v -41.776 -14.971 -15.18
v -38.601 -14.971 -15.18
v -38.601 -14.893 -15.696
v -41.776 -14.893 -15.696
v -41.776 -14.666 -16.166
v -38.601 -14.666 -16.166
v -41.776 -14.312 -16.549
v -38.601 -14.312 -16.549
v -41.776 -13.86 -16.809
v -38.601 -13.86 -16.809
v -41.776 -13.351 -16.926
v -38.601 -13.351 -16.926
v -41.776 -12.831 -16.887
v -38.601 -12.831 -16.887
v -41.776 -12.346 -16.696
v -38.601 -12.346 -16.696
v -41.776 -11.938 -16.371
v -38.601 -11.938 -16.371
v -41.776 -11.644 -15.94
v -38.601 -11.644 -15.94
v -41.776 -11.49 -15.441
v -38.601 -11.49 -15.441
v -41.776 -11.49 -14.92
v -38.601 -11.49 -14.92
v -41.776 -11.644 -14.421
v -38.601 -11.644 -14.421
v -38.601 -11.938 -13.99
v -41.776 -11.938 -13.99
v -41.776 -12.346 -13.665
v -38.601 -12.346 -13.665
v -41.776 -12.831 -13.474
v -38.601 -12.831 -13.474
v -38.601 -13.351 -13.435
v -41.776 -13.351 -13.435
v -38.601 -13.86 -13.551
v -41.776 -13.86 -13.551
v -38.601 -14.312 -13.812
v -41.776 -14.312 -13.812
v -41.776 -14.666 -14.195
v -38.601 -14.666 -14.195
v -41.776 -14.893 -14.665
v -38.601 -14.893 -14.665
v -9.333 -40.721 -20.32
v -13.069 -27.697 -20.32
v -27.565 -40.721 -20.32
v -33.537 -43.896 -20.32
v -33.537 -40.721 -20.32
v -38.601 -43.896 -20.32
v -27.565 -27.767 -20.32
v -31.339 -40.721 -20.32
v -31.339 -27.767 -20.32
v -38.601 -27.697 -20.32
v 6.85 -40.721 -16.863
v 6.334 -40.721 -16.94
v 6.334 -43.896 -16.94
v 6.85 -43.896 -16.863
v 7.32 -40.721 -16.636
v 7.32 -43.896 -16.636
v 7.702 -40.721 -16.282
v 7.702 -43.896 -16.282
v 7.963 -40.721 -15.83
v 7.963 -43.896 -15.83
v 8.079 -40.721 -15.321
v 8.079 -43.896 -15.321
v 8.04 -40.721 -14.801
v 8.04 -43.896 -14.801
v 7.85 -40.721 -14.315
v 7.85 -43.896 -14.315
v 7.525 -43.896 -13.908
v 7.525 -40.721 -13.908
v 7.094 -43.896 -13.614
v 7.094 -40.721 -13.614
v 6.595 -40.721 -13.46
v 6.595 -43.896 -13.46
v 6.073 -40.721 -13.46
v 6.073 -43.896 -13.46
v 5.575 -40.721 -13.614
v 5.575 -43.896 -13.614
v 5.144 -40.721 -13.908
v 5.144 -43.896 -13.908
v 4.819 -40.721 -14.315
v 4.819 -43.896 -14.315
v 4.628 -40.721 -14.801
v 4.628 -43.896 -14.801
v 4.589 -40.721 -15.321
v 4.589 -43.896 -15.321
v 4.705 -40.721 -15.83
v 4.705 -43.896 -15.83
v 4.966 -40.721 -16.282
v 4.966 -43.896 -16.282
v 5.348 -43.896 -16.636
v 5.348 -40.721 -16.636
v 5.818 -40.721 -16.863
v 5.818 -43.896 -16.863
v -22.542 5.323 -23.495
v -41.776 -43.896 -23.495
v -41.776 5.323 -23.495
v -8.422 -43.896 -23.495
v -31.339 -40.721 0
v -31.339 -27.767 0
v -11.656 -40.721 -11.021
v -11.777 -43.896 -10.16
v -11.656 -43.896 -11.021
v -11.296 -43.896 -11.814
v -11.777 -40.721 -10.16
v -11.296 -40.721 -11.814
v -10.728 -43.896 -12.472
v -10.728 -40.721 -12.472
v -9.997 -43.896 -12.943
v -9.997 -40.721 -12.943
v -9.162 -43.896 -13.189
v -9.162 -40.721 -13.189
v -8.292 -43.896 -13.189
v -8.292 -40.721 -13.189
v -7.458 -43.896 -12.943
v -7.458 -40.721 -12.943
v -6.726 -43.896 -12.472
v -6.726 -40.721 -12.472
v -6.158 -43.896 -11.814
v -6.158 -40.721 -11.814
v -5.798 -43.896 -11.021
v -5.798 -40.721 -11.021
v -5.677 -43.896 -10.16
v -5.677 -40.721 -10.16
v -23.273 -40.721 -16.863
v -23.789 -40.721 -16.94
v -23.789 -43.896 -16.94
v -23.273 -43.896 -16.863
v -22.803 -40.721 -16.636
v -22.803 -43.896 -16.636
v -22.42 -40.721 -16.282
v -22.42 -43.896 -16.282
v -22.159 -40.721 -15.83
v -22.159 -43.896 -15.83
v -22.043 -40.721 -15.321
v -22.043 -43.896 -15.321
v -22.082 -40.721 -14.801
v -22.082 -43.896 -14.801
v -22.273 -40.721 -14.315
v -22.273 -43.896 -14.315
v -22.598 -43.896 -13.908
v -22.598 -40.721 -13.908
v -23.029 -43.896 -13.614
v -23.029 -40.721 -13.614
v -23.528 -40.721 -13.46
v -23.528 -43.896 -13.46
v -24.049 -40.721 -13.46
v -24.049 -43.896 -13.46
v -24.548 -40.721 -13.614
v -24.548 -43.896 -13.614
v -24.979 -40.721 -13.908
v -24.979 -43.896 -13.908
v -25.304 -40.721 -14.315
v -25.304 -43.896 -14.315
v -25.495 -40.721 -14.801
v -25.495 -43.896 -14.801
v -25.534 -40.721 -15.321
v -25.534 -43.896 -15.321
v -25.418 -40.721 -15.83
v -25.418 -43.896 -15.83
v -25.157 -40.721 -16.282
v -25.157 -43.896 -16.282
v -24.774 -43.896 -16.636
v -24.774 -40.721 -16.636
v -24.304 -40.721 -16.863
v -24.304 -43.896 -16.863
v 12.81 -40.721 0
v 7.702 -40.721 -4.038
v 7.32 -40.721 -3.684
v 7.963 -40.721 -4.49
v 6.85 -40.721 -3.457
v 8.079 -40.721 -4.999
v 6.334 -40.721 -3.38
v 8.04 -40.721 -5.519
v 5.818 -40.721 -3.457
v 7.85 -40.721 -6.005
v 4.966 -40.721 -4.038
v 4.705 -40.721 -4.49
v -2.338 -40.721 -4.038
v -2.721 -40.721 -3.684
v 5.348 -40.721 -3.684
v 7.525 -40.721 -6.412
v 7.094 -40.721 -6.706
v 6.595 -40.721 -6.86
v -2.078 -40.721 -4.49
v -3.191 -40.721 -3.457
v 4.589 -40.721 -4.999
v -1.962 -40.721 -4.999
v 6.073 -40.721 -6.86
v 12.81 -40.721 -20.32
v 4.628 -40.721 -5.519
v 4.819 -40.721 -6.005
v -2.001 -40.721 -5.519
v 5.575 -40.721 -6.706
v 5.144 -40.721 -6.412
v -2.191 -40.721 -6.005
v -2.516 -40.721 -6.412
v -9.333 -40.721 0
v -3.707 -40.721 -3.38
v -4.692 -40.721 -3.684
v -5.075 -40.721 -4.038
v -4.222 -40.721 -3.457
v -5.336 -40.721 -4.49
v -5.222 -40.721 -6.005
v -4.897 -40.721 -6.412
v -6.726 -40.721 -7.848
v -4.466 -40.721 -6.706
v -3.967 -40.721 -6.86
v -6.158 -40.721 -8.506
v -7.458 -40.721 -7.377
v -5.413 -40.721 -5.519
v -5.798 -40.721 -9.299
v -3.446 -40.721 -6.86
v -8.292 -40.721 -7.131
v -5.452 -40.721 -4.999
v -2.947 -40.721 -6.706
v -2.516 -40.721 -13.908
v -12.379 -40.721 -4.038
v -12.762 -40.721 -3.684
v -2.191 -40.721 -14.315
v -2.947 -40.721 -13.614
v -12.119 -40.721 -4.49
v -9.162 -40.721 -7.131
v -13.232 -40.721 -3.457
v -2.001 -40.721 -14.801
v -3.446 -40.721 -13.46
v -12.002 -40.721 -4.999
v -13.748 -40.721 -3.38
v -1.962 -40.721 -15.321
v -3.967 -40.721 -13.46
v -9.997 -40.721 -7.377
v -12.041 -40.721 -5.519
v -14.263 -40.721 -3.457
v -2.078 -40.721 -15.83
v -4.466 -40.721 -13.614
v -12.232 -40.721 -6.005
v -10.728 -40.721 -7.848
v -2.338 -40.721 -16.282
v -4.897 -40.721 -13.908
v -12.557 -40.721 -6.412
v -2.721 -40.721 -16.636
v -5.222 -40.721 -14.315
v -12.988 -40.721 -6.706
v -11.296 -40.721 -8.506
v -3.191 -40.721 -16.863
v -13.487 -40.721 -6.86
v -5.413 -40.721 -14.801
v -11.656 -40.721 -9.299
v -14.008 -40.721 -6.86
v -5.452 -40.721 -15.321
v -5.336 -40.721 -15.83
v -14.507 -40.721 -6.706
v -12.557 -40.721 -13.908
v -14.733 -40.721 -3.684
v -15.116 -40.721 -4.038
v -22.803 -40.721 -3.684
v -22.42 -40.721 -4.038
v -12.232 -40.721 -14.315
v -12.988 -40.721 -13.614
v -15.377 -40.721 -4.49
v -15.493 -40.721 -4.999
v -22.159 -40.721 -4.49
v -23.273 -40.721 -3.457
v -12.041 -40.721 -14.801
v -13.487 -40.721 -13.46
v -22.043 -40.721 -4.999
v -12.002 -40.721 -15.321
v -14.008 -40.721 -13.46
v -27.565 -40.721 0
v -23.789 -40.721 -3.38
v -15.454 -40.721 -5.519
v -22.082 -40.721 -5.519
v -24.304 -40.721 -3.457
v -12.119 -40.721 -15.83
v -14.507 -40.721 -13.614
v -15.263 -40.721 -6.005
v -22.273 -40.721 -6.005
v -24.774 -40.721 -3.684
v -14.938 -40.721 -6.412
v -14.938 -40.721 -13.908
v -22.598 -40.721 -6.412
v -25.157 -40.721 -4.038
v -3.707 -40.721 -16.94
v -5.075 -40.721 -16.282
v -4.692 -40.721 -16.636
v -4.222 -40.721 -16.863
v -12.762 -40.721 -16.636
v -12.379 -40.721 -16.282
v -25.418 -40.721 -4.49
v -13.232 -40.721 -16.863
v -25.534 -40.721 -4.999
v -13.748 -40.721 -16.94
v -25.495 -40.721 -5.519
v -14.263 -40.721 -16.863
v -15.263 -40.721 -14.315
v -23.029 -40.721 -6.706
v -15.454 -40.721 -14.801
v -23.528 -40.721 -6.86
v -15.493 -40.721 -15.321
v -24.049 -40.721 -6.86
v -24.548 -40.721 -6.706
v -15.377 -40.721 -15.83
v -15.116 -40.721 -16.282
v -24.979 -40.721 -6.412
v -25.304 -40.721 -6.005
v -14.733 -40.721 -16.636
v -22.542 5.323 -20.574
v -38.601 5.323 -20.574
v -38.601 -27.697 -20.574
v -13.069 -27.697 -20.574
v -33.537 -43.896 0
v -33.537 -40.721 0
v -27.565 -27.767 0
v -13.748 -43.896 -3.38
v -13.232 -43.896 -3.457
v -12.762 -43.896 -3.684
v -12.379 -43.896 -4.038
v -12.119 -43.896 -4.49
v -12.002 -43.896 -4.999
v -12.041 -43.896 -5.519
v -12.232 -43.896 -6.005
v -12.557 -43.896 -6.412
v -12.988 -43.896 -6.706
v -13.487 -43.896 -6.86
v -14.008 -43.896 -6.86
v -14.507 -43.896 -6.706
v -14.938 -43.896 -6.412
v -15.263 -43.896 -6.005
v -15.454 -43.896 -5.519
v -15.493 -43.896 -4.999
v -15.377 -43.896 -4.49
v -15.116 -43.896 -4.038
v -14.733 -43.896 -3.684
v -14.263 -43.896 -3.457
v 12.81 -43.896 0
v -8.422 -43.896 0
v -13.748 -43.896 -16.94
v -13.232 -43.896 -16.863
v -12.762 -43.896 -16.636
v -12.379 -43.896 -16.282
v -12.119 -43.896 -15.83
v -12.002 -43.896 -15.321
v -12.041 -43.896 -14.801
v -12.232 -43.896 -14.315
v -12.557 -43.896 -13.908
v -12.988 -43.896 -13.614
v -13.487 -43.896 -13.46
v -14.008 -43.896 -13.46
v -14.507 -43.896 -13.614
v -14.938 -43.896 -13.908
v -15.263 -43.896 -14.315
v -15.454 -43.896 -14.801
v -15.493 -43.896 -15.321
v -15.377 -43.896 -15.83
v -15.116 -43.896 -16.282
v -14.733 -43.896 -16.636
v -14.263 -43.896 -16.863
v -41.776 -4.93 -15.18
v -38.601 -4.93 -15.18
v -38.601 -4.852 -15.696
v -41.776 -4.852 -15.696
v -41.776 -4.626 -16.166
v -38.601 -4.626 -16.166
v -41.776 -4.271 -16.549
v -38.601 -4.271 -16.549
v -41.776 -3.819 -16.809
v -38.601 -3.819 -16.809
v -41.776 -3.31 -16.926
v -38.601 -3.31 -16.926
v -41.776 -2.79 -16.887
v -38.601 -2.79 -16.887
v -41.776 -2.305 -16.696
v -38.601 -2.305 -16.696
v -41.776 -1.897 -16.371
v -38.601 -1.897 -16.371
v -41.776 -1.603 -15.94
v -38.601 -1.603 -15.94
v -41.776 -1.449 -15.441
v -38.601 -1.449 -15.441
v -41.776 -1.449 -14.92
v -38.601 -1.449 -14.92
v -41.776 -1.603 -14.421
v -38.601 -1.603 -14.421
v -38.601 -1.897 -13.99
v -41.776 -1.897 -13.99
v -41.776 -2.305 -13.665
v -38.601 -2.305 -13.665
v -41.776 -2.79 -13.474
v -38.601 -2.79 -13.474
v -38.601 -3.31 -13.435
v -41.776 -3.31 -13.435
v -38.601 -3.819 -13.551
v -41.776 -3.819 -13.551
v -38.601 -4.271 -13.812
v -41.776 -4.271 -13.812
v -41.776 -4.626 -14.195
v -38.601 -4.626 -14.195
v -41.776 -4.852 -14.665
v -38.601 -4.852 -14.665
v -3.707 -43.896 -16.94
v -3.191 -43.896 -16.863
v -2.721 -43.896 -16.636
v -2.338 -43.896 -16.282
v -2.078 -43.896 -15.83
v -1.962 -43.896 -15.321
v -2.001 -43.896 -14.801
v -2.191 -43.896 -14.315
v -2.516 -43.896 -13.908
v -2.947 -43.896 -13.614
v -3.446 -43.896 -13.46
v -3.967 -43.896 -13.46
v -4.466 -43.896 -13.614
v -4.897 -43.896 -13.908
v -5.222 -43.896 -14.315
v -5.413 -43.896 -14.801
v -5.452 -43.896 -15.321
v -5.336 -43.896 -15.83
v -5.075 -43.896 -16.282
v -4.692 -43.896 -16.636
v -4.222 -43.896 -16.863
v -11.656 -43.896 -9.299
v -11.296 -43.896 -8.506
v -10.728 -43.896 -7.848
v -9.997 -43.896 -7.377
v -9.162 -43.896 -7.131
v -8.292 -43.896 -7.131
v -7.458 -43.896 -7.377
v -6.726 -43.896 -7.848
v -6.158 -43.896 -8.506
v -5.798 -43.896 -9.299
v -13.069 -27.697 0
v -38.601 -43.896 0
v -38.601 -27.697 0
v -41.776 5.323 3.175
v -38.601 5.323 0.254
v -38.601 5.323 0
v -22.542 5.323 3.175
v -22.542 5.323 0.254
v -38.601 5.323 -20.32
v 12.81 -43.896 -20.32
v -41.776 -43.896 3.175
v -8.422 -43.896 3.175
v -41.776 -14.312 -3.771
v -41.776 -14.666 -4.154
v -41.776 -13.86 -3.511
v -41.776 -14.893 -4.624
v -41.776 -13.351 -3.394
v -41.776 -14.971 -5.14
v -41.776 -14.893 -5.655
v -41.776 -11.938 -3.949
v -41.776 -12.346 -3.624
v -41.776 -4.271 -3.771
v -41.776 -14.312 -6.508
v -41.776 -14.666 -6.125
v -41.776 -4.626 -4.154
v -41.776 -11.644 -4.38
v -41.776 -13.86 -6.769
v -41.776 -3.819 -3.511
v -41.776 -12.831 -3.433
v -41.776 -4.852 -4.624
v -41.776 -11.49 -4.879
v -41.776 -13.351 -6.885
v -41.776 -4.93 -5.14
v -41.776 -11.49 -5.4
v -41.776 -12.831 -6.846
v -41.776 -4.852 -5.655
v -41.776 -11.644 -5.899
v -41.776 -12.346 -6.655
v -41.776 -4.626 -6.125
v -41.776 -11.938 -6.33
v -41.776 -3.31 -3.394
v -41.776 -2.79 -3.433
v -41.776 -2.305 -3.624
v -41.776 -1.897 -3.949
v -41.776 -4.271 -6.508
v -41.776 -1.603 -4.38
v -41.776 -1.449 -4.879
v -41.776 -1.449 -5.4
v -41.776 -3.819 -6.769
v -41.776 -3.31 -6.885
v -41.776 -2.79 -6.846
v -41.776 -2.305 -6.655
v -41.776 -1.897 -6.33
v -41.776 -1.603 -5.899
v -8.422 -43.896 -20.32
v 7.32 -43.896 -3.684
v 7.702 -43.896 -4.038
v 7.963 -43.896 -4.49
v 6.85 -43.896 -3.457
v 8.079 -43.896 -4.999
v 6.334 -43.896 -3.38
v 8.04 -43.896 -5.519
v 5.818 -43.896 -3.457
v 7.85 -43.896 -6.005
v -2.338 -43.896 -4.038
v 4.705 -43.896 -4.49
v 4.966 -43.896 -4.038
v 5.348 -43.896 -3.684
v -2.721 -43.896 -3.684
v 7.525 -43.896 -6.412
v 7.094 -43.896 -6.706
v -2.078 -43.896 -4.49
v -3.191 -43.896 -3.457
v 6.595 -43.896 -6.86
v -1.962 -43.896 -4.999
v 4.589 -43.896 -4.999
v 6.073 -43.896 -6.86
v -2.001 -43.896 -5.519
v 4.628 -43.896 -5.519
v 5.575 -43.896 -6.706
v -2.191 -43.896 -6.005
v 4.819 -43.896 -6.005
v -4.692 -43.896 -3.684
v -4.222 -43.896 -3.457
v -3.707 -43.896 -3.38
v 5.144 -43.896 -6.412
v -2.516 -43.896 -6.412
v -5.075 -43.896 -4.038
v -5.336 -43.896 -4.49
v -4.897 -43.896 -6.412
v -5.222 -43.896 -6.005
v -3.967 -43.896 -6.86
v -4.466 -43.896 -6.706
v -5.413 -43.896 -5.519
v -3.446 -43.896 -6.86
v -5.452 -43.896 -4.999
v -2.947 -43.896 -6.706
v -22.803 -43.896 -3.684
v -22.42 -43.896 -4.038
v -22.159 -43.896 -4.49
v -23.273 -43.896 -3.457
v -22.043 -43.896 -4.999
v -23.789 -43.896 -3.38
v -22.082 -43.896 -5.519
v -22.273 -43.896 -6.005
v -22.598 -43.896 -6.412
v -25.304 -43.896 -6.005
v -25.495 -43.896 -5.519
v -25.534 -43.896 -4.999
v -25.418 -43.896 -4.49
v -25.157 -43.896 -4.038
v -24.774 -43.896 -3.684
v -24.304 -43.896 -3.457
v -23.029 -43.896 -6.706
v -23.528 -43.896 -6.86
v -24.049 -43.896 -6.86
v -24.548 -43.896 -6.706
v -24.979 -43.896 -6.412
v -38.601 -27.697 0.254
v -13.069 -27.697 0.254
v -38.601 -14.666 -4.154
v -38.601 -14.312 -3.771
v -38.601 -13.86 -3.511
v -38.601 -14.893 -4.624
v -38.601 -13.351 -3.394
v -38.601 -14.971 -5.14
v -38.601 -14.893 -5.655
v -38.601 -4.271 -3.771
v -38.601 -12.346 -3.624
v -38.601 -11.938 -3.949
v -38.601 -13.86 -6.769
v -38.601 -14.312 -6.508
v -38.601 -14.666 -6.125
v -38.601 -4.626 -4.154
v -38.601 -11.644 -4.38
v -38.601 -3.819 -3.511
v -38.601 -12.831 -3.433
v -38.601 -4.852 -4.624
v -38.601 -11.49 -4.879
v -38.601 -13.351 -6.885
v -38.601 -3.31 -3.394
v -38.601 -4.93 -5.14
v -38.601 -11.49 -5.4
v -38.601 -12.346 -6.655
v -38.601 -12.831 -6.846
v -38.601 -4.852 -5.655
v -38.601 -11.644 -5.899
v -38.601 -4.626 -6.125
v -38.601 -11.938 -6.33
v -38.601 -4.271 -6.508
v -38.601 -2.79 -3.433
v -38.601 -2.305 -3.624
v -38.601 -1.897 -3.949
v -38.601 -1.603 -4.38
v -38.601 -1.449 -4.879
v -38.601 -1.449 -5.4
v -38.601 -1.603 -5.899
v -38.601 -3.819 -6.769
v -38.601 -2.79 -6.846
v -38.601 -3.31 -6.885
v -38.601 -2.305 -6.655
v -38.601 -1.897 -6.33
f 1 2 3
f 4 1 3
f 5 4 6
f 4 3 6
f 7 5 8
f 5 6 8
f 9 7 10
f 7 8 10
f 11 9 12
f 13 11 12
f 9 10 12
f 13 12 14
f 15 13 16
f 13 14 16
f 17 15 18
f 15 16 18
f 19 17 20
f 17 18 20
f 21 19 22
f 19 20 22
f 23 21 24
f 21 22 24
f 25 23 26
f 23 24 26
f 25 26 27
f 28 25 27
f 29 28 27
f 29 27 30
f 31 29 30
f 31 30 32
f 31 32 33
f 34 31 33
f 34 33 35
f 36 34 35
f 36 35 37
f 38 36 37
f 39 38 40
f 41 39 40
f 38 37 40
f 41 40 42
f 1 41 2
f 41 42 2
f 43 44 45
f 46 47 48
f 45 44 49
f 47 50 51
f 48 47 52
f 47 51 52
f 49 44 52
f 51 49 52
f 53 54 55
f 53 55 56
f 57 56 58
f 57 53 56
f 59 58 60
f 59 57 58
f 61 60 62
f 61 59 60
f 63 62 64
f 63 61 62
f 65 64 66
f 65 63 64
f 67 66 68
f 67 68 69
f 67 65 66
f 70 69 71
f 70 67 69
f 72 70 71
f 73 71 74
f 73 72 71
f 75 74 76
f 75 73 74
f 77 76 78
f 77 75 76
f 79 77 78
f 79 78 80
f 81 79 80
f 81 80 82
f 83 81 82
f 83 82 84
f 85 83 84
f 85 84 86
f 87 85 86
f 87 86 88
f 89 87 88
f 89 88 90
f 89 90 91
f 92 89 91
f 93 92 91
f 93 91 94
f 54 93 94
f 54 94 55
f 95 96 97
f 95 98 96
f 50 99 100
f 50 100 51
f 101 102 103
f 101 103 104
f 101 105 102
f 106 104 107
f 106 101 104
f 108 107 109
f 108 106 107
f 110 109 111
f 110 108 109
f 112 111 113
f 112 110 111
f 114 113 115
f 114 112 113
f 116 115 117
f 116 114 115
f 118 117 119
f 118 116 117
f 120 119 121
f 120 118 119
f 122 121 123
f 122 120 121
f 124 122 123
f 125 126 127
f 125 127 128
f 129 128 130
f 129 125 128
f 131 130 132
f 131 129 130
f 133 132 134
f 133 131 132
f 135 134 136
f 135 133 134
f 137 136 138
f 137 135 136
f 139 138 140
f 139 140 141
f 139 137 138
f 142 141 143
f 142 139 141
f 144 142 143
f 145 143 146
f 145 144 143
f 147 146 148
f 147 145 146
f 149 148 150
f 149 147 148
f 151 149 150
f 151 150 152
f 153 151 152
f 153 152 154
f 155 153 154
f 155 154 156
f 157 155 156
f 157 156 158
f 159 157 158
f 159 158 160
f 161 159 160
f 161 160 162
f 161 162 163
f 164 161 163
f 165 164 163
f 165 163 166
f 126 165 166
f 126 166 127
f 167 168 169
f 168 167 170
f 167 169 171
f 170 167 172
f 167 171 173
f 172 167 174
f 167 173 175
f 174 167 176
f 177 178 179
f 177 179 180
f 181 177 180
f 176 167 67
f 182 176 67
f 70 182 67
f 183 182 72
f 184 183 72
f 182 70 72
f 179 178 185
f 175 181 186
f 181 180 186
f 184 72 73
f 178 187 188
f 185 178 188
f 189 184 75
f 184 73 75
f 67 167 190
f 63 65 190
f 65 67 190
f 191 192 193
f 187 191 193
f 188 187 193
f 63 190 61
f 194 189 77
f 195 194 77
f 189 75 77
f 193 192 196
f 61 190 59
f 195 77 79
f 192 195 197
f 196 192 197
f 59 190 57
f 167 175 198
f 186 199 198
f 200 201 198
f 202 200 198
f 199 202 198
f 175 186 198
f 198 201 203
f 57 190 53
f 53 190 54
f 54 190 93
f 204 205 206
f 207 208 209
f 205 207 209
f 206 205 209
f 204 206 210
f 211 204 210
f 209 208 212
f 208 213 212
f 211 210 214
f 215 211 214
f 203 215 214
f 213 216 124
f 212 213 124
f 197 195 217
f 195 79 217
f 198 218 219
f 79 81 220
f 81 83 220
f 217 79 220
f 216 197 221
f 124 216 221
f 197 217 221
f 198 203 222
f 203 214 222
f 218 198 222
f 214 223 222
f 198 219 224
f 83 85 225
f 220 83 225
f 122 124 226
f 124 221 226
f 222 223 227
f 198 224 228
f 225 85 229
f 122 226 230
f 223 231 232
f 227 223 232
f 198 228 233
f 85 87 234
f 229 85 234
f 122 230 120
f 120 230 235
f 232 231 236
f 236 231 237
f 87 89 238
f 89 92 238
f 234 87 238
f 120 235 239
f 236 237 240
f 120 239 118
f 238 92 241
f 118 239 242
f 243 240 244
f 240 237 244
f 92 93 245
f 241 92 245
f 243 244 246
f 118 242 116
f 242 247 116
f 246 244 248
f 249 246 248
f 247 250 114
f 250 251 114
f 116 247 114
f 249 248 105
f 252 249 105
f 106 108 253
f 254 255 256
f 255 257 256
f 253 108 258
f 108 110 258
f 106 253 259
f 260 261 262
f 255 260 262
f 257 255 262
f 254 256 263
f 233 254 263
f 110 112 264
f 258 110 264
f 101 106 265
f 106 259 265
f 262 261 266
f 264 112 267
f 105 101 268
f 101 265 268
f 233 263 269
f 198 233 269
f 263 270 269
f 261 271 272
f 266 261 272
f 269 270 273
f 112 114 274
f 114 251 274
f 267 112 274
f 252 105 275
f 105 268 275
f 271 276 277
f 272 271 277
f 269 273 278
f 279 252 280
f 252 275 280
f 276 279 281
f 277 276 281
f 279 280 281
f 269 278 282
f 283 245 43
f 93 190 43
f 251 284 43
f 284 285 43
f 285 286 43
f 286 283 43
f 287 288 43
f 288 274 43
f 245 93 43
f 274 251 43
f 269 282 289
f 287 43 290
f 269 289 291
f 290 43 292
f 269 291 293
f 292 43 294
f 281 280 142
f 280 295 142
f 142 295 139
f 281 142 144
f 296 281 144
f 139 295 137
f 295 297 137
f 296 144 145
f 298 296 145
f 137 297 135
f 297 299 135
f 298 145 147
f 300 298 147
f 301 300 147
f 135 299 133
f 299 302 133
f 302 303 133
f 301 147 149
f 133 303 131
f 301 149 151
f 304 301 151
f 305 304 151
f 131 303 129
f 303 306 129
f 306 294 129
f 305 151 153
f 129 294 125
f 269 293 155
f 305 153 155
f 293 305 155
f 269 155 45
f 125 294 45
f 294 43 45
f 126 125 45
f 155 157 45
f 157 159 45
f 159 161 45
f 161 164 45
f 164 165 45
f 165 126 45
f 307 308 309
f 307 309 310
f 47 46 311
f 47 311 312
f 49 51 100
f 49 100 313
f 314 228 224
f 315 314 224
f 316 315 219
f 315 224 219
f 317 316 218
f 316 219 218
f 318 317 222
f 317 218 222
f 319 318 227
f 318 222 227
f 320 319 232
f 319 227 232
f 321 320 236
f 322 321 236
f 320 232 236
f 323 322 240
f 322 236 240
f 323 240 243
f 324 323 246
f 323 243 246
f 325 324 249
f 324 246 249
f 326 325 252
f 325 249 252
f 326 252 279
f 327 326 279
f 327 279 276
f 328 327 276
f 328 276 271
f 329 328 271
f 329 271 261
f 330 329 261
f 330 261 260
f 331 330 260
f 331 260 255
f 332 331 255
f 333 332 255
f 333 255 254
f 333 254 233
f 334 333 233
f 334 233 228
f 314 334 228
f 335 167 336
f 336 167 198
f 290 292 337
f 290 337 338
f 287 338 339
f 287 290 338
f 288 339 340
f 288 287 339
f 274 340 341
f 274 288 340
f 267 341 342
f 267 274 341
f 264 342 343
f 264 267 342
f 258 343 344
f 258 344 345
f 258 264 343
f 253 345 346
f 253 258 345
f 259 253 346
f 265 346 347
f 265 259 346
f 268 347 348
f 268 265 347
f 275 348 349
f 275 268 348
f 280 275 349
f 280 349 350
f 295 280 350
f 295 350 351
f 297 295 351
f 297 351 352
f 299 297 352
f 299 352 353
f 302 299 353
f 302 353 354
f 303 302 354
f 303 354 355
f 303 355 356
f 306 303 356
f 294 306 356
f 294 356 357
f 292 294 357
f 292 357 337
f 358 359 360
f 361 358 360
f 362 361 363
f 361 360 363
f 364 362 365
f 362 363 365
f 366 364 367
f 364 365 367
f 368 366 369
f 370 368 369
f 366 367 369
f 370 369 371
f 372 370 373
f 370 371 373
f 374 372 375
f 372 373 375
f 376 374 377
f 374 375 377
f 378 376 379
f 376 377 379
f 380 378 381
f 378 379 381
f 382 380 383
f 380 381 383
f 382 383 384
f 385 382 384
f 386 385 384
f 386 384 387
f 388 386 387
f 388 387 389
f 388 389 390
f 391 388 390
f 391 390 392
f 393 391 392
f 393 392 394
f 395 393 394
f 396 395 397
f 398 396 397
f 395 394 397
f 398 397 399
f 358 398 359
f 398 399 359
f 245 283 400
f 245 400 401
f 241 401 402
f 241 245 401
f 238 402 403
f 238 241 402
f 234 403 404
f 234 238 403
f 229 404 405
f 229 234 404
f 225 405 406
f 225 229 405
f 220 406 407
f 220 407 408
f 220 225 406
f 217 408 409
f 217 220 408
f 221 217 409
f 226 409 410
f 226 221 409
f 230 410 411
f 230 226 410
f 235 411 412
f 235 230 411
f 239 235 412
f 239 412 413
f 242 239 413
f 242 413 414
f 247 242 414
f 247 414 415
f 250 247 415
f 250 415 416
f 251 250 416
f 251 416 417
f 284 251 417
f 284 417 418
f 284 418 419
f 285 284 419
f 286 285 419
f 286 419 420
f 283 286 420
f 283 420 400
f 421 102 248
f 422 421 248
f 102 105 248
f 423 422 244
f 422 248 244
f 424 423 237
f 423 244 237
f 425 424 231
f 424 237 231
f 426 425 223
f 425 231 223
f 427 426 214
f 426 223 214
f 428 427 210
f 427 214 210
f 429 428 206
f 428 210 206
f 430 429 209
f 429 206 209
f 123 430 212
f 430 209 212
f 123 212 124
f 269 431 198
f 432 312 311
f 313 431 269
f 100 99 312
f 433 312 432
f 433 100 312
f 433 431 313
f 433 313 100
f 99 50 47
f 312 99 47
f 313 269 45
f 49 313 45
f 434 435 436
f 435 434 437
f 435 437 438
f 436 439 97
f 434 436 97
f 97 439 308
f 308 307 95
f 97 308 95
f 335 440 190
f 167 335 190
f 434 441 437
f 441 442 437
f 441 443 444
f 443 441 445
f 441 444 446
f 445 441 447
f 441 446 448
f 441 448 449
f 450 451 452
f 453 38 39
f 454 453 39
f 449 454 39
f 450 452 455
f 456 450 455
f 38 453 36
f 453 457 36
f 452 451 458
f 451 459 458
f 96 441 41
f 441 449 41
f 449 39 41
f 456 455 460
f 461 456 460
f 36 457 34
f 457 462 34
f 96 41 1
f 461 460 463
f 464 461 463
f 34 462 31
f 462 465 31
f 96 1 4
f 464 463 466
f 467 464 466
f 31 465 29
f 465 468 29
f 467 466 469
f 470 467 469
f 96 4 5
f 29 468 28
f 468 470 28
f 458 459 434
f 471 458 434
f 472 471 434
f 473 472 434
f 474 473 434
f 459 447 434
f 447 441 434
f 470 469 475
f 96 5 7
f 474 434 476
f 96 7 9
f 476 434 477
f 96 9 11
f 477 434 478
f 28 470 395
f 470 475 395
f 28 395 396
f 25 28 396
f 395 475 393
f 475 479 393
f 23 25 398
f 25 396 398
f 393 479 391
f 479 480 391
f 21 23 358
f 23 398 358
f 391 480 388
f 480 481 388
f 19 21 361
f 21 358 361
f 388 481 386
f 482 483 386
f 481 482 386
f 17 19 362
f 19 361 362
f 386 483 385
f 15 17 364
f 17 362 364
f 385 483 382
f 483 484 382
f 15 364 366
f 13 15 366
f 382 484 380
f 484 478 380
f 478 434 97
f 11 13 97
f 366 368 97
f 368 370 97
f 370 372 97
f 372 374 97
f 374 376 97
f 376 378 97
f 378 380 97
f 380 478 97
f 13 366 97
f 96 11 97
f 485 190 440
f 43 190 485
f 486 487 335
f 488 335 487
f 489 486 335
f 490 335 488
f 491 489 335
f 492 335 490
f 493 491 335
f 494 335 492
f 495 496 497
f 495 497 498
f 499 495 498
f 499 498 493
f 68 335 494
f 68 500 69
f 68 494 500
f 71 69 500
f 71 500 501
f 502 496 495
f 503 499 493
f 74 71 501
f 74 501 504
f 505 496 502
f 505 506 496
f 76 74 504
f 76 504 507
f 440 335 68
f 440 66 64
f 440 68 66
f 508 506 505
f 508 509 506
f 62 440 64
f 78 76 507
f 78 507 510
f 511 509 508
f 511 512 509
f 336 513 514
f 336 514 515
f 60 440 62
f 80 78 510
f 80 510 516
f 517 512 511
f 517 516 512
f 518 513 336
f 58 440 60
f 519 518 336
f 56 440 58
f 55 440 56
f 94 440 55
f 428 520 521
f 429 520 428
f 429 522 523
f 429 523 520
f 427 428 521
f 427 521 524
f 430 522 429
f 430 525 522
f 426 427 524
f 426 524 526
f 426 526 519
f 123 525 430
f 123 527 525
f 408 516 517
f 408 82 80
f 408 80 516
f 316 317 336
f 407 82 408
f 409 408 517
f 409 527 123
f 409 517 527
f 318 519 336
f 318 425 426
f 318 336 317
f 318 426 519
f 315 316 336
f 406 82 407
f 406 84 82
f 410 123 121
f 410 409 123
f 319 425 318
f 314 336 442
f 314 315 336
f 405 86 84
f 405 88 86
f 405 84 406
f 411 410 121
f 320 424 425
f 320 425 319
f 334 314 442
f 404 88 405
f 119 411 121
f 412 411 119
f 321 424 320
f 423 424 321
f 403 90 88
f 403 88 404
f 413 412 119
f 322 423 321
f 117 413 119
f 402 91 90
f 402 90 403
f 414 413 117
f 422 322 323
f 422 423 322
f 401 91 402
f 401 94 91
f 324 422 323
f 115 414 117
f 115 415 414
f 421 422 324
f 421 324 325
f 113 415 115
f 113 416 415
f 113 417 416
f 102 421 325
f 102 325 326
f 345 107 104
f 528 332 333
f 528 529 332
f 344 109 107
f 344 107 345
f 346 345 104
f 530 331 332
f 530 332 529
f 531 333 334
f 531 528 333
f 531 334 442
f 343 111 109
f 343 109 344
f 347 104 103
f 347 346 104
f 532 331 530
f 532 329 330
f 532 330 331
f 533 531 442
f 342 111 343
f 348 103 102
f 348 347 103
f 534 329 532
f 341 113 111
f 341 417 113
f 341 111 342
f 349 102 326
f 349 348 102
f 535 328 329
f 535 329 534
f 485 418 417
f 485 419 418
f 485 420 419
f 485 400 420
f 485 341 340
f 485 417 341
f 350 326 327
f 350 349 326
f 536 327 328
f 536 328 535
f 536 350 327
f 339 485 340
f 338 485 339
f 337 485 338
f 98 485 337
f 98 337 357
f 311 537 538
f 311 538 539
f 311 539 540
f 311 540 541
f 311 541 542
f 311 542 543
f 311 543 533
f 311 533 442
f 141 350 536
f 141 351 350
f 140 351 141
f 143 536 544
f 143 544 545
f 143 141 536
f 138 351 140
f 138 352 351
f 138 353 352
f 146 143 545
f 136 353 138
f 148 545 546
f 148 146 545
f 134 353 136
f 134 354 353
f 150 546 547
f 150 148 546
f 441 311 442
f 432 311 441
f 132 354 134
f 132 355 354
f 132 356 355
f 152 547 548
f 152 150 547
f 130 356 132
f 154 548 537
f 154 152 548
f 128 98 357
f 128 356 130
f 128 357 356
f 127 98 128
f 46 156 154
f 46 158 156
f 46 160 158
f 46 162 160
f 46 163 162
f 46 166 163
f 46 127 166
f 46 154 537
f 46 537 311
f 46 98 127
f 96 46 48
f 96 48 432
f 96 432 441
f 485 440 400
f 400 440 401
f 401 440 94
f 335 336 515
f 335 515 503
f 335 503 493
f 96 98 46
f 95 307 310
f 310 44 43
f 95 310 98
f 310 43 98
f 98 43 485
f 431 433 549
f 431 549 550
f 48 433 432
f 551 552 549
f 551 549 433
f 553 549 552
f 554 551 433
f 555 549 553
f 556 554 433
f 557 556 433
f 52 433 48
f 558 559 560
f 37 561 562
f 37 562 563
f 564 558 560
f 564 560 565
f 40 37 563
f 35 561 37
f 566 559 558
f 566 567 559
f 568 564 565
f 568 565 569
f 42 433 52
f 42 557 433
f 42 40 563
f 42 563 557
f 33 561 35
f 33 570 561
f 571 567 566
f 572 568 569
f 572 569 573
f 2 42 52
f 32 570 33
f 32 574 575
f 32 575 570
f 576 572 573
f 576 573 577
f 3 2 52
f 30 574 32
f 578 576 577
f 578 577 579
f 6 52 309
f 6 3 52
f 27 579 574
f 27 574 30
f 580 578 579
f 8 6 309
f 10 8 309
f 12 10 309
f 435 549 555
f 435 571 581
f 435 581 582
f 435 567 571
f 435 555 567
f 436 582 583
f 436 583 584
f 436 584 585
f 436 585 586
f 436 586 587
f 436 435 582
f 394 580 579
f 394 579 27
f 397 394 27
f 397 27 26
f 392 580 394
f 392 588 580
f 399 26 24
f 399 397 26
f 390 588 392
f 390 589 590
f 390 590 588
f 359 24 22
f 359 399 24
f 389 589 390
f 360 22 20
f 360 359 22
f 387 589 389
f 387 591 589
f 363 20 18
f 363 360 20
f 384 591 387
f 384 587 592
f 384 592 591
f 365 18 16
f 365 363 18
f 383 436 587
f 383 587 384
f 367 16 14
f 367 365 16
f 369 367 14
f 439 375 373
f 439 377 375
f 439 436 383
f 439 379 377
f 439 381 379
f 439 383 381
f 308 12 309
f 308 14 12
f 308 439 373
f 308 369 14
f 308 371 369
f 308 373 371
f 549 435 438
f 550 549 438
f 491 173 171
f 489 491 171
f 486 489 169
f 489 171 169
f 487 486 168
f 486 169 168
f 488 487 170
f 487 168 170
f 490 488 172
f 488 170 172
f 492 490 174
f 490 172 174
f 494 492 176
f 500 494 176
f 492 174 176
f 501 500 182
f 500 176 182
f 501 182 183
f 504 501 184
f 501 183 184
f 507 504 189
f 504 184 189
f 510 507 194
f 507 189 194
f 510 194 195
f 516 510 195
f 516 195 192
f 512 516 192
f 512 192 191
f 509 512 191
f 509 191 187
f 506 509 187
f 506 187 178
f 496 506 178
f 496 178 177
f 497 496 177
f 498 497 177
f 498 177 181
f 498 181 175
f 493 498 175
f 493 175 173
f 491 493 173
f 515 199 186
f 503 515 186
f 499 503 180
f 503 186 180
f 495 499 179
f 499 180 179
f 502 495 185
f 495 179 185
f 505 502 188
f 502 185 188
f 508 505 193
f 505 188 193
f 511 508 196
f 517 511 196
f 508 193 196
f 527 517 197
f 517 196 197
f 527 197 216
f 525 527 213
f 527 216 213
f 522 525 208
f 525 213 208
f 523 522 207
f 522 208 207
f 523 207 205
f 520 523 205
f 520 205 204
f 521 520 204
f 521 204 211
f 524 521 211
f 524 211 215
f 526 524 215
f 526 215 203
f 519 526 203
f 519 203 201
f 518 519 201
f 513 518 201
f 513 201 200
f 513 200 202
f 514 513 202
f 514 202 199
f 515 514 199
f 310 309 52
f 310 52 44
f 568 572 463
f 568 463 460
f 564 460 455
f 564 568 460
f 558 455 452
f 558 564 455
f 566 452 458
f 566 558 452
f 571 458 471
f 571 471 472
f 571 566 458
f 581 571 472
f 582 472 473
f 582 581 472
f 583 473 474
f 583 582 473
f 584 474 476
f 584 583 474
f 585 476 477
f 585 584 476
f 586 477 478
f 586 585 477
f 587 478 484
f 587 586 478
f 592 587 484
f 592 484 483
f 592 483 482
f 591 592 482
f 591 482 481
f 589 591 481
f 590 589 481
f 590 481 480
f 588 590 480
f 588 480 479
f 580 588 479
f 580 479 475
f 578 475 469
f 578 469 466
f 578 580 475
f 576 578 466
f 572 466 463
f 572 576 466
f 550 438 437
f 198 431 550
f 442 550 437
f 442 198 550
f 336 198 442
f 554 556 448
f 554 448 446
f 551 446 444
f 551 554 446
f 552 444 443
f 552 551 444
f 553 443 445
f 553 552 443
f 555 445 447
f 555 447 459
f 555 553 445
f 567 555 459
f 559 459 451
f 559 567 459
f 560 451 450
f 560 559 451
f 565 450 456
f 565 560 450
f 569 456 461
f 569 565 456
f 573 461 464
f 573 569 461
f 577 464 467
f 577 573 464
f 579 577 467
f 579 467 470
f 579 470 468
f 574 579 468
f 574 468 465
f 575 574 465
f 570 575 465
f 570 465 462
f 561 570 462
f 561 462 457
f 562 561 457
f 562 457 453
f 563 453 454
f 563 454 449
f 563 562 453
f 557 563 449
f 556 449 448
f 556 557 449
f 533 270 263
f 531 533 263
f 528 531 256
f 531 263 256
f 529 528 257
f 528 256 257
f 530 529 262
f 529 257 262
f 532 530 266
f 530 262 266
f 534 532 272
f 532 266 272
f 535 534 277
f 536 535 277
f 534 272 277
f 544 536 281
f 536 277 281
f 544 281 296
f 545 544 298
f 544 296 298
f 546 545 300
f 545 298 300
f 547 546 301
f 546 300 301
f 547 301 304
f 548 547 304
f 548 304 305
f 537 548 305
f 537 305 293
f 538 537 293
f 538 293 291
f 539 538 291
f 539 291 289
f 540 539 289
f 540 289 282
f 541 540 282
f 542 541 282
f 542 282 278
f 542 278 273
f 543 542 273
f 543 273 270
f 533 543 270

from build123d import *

# Parameters (mm, degrees)
BOSS_EXTRUDE1_DEPTH = 3.175
SKETCH2_W           = 13.335000012
SKETCH2_H           = 49.21889014
SKETCH2_R           = 1.75
BOSS_EXTRUDE2_DEPTH = 3.175
SKETCH3_W           = 46.34698368
SKETCH3_H           = 3.175
BOSS_EXTRUDE3_DEPTH = 10.160000012
SKETCH4_R           = 1.75
SKETCH4_R_2         = 3.05
CUT_EXTRUDE1_DEPTH  = 8.255
SKETCH5_W           = 3.773247043
SKETCH5_H           = 20.320000025
BOSS_EXTRUDE4_DEPTH = 12.954
SKETCH6_W           = 34.699402295
SKETCH6_H           = 0.254
CUT_EXTRUDE2_DEPTH  = 33.02


with BuildPart() as part:
    # Sketch1 → Boss-Extrude1 (new body)
    with BuildSketch(Plane.XY):
        Polygon((-22.541561274, 5.323288391), (-8.422284226, -43.895601749), (-38.601131181, -43.895601749), (-38.601131181, 5.323288391), align=None)
    extrude(amount=BOSS_EXTRUDE1_DEPTH)

    # Sketch2 → Boss-Extrude2 (add)
    with BuildSketch(Plane.ZY.offset(38.601131181)):
        with Locations((-3.492500006, -19.286156679)):
            Rectangle(SKETCH2_W, SKETCH2_H)
        with Locations(Location((-5.139541866, -3.179625598, 0), (0, 0, 270))):
            Circle(SKETCH2_R, mode=Mode.SUBTRACT)
        with Locations(Location((-5.139541866, -13.22054189, 0), (0, 0, 270))):
            Circle(SKETCH2_R, mode=Mode.SUBTRACT)
    extrude(amount=BOSS_EXTRUDE2_DEPTH)

    # Sketch3 → Boss-Extrude3 (add)
    with BuildSketch(Plane(origin=(0, 0, 0), x_dir=(-1, 0, 0), z_dir=(0, 0, -1))):
        with Locations((10.363026284, -42.308101749)):
            Rectangle(SKETCH3_W, SKETCH3_H)
    extrude(amount=BOSS_EXTRUDE3_DEPTH)

    # Sketch4 → Cut-Extrude1 (cut)
    with BuildSketch(Plane(origin=(0, -40.720601749, 0), x_dir=(1, 0, 0), z_dir=(0, 1, 0))):
        with Locations(Location((-3.706673055, 5.129541844, 0), (0, 0, 270))):
            Circle(SKETCH4_R)
        with Locations(Location((-23.788505641, 5.129541844, 0), (0, 0, 270))):
            Circle(SKETCH4_R)
        with Locations((6.334243237, 15.170458137)):
            Circle(SKETCH4_R)
        with Locations((-8.727131202, 10.149999991)):
            Circle(SKETCH4_R_2)
        with Locations(Location((6.334243237, 5.129541844, 0), (0, 0, 270))):
            Circle(SKETCH4_R)
        with Locations(Location((-13.747589348, 5.129541844, 0), (0, 0, 270))):
            Circle(SKETCH4_R)
        with Locations((-23.788505641, 15.170458137)):
            Circle(SKETCH4_R)
        with Locations((-3.706673055, 15.170458137)):
            Circle(SKETCH4_R)
        with Locations((-13.747589348, 15.170458137)):
            Circle(SKETCH4_R)
    extrude(amount=-CUT_EXTRUDE1_DEPTH, mode=Mode.SUBTRACT)

    # Mirror3: part across plane


with BuildPart() as part_1:
    add(part.part)
    add(part.part.mirror(Plane(origin=(-41.776131181, 5.323288391, -10.160000012), x_dir=(1, 0, 0), z_dir=(0, 0, 1))))

    # Sketch5 → Boss-Extrude4 (add)
    with BuildSketch(Plane(origin=(0, -40.720601749, 0), x_dir=(1, 0, 0), z_dir=(0, 1, 0))):
        with Locations((-29.452107965, 10.160000013)):
            Rectangle(SKETCH5_W, SKETCH5_H)
    extrude(amount=BOSS_EXTRUDE4_DEPTH)

    # Sketch6 → Cut-Extrude2 (cut)
    with BuildSketch(Plane(origin=(0, 5.323288391, 0), x_dir=(1, 0, 0), z_dir=(0, 1, 0))):
        with Locations((-21.251430034, 20.447000025)):
            Rectangle(SKETCH6_W, SKETCH6_H)
        with Locations((-21.251430034, -0.127)):
            Rectangle(SKETCH6_W, SKETCH6_H)
    extrude(amount=-CUT_EXTRUDE2_DEPTH, mode=Mode.SUBTRACT)


solid = part_1.part
